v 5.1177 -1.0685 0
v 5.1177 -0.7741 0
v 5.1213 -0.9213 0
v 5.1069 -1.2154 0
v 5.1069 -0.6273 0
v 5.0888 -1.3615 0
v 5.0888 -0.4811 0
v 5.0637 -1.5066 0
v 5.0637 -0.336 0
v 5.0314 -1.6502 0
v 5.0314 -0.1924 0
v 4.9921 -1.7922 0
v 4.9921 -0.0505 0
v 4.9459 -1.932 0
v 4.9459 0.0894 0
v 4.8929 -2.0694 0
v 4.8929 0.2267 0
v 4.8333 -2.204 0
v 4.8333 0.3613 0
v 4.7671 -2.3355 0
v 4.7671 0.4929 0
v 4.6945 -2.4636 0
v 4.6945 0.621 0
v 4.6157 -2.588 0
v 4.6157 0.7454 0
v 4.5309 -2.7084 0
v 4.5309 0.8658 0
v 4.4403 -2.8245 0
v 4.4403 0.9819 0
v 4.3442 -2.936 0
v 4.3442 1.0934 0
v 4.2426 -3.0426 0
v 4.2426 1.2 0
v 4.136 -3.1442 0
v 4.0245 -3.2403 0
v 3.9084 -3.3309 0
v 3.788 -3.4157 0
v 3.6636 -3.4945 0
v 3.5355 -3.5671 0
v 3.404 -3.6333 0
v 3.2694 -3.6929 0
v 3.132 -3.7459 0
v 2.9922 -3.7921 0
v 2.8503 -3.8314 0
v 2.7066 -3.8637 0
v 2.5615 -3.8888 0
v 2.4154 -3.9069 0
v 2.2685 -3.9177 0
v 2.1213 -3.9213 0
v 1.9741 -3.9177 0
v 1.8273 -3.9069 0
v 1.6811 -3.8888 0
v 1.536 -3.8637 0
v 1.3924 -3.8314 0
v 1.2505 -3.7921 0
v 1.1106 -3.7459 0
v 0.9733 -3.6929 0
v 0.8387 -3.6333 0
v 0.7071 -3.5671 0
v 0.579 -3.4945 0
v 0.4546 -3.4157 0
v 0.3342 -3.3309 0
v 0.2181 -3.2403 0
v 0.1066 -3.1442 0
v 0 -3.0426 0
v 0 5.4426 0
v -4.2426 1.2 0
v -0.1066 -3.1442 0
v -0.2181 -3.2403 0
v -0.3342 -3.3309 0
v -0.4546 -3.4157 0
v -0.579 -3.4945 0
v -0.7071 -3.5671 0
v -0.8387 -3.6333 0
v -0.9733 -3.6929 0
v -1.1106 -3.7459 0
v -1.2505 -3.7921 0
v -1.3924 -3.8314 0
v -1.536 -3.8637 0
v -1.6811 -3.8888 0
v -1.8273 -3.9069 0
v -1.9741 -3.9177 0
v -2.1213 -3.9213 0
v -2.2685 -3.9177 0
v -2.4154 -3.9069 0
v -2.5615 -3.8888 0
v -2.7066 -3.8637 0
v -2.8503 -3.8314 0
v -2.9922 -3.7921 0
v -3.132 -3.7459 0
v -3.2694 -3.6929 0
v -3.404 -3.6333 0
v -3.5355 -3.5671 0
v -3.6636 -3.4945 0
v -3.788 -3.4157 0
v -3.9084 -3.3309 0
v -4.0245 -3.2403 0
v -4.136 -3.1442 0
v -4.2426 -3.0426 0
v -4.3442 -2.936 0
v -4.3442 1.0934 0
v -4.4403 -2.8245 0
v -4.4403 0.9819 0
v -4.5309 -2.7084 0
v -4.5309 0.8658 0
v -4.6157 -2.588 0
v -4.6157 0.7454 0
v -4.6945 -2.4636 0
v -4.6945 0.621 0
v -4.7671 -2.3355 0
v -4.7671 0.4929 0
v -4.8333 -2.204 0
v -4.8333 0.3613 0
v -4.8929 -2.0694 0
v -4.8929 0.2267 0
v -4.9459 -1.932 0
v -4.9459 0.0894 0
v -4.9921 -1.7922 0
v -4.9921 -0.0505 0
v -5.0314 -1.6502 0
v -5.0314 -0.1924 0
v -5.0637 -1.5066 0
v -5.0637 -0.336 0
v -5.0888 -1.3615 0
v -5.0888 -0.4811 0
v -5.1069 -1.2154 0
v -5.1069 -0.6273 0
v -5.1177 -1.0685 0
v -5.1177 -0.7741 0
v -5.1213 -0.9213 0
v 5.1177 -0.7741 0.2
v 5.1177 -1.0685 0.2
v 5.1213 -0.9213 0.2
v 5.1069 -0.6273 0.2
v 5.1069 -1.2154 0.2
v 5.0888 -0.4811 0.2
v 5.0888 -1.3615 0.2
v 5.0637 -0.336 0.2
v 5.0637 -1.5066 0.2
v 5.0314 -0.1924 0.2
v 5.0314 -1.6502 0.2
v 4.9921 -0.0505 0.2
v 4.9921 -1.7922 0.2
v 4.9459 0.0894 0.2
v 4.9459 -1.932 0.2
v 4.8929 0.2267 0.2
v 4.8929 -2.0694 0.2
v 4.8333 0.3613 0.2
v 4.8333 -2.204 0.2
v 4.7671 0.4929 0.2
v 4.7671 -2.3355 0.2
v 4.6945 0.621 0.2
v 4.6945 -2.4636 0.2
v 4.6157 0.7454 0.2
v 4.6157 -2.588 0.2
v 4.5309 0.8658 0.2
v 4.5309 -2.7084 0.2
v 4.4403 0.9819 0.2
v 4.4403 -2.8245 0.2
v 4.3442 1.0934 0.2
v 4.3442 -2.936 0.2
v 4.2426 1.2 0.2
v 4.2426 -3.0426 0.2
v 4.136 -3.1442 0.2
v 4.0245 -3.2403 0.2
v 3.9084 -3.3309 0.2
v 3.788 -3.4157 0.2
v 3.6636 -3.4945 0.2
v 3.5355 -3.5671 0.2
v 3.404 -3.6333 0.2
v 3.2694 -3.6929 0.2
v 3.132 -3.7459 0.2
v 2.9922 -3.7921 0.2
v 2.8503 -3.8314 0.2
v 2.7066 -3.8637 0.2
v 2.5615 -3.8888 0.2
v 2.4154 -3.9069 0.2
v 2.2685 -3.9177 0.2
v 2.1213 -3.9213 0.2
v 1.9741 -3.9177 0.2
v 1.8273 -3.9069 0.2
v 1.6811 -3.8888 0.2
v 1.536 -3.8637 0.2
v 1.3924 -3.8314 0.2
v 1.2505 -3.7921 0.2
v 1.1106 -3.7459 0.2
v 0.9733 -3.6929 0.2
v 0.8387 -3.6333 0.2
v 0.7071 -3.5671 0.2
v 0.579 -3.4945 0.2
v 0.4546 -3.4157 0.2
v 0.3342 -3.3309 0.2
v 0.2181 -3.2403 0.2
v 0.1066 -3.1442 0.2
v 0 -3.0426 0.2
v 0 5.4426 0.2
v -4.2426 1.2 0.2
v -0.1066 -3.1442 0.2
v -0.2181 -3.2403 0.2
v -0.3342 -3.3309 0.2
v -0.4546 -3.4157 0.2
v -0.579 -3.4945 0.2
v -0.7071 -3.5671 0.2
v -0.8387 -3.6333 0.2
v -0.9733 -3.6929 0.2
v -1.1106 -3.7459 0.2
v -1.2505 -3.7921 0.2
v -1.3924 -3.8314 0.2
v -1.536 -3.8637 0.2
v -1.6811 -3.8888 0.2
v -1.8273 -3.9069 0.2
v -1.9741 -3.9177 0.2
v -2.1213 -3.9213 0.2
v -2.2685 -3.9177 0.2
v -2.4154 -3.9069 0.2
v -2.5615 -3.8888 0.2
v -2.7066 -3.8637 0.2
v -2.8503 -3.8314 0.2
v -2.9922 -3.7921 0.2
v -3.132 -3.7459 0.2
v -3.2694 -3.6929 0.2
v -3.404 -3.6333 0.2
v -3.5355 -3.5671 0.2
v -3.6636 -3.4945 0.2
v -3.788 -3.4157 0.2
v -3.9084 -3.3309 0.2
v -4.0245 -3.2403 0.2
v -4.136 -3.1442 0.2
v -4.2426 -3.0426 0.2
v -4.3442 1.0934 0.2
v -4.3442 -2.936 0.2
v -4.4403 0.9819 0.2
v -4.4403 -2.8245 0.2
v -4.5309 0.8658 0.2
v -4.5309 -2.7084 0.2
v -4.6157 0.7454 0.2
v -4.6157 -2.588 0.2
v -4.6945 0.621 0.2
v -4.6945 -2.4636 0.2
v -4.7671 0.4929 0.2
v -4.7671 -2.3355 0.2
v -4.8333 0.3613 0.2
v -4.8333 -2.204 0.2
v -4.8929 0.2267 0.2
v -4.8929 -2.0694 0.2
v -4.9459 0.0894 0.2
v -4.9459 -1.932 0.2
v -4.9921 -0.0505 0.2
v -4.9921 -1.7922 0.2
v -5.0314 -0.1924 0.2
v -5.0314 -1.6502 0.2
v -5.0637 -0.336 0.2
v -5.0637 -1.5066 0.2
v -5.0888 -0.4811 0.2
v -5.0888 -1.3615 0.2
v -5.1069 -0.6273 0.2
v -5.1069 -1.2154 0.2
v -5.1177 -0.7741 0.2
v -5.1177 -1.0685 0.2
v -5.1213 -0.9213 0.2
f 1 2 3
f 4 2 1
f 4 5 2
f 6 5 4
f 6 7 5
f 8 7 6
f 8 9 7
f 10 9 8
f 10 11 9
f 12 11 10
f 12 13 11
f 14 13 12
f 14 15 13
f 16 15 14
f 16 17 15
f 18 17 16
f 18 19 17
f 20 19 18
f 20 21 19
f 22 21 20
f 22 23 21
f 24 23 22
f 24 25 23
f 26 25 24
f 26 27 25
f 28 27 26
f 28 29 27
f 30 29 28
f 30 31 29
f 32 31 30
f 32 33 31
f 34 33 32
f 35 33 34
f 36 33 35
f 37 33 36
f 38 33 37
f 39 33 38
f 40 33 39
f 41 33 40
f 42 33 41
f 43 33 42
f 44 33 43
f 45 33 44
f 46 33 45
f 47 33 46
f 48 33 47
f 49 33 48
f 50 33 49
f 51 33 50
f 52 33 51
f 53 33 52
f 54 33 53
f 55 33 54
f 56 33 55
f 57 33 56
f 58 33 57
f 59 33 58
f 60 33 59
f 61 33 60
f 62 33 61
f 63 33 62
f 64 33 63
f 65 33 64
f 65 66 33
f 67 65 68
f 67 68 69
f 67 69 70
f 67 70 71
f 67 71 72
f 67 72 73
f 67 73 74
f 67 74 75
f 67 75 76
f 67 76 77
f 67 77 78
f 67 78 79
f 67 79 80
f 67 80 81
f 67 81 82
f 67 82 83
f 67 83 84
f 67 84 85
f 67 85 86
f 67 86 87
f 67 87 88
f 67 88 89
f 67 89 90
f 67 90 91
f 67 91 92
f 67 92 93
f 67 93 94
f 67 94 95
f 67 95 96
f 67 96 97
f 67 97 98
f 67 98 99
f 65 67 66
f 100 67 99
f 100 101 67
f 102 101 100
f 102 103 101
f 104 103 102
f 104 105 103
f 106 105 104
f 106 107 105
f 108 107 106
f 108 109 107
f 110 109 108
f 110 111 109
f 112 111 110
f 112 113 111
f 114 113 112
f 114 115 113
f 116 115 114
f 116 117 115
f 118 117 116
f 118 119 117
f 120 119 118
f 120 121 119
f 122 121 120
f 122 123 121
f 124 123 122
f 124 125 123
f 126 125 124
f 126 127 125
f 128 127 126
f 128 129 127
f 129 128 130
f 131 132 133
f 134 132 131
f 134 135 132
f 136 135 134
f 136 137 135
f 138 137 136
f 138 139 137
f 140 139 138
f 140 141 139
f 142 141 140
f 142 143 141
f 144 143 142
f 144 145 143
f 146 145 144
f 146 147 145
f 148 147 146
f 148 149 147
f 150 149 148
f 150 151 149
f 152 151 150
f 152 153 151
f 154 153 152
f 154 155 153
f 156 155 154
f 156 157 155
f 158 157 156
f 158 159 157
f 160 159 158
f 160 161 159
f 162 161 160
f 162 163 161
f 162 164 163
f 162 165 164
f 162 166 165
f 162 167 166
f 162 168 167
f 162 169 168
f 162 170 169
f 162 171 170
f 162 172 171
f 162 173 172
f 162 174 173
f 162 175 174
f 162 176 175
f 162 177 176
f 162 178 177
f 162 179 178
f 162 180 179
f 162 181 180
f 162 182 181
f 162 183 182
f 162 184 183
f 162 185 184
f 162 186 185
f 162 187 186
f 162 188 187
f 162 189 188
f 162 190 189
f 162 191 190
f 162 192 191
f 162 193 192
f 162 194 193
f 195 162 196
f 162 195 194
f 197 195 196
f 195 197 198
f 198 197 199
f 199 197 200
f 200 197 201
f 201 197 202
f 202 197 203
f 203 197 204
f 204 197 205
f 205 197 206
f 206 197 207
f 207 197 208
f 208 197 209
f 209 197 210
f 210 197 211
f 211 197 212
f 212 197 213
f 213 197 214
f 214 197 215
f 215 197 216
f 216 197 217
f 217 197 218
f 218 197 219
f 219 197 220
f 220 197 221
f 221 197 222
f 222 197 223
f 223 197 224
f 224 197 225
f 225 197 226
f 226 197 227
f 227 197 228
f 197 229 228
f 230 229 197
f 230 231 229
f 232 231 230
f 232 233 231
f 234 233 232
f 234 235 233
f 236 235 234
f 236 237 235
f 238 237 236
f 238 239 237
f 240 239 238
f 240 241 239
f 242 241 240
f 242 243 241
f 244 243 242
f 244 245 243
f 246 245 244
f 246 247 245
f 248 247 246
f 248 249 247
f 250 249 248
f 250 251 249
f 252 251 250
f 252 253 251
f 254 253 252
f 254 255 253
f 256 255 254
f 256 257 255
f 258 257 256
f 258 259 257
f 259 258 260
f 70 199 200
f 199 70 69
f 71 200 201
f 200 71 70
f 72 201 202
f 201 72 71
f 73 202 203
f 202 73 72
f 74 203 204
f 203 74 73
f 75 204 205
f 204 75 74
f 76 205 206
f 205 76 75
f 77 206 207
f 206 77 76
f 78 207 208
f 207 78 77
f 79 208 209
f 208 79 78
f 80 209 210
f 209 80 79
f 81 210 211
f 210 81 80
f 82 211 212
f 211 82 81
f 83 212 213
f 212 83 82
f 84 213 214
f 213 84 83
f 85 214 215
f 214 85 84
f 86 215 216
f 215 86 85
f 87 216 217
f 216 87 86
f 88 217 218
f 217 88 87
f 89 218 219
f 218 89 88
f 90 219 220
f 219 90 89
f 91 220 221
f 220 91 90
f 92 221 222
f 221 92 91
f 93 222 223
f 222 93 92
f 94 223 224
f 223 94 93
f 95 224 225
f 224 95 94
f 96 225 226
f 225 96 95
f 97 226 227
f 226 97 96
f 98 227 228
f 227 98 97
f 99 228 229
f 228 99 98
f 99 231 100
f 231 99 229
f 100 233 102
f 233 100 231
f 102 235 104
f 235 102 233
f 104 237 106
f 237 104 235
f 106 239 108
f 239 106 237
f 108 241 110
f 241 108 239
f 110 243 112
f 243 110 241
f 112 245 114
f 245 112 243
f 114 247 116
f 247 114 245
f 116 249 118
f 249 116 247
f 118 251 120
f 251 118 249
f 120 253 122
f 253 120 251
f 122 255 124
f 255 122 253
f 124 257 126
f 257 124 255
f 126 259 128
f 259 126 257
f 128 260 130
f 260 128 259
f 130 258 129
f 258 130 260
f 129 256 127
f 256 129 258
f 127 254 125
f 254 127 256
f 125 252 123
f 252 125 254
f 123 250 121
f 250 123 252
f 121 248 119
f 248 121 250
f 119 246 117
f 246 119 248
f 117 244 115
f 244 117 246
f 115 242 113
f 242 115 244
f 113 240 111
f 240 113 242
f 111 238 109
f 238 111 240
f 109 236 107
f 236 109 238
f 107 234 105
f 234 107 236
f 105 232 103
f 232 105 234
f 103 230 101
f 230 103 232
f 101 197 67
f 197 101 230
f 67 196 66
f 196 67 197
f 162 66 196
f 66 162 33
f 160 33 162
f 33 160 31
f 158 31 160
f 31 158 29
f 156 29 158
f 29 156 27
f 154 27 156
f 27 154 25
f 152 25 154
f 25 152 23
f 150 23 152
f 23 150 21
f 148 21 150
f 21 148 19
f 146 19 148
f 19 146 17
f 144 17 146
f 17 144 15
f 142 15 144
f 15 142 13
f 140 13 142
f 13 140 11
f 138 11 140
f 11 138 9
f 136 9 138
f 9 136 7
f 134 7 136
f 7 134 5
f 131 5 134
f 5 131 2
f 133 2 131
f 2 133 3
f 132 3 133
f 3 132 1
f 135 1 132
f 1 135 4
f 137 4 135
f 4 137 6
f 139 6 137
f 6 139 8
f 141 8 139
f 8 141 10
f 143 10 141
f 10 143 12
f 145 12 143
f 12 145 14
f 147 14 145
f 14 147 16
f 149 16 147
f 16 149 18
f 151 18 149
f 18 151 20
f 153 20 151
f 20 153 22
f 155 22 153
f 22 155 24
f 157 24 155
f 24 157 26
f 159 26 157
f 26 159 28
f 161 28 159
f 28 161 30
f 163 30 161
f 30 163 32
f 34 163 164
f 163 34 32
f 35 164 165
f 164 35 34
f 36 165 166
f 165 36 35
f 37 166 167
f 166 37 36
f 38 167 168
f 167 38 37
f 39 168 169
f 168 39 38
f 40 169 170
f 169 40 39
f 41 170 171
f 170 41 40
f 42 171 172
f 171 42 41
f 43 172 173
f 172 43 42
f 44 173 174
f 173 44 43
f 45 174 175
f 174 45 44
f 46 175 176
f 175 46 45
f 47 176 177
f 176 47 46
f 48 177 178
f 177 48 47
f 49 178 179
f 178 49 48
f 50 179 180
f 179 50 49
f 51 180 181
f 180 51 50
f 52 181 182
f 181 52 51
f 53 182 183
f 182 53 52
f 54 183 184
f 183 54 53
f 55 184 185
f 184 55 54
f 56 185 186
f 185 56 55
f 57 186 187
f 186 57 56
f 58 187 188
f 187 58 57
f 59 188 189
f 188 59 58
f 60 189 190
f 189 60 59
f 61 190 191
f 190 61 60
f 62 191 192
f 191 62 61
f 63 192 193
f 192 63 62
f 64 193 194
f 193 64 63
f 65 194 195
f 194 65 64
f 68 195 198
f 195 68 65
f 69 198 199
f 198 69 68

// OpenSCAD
size_diameter_map = [0, 12.04, 12.45, 12.85, 13.26, 13.67, 14, 14.4, 14.8, 15.2, 15.6, 16.0, 16.45, 16.9, 17.3, 17.7, 18.2, 18.6, 19.0, 19.4, 19.8, 20.2, 20.6, 21.0, 21.4, 21.8, 22.2, 22.6];
function ring_radius_from_US_size(size) = size_diameter_map[size*2]/2;

echo(version());


//ring_size = 10.5; cone_angle=60; // alan
ring_size = 2; cone_angle=30; // dana 2025/02


// would prefer to factor these parameter computations into 
// a factored out function...

// high level ring design parameters
rt=2;   // ring band thickness (nominal)
seal_depth = 0.2;
seal_radius_relative = 0.75;
//cone_angle=30;

band_width = 5;

// computed parameters
ri = ring_radius_from_US_size(ring_size);  // ring inner radius
ro=ri+rt;  // ring outer radius (sphere outer radius)
d = ro*sin(cone_angle/2);   // |(sphere center) - (cone base)|
r1 = ro*cos(cone_angle/2);  // cone radius
h = ro/sin(cone_angle/2) - d;  // cone height

r_top = 2*(ro-d)/h*r1; // signet top radius  TODO this equation is wrong
r_logo = r_top * seal_radius_relative;  // radius of containing circle of logo
echo("r_logo", r_logo);
echo("r_top", r_top);
echo(d);


module smooth_ring_base() {
    // https://www.thingiverse.com/thing:2011638/files
    // sphere, cone, shave off top and bottom
    // logo on top
    // inscription on bottom
    // two cubes to make it slanty
    // TODO bevel sharp edge    
    
    difference() {
        union() {
            // main body
            sphere(r=ro, $fn=64);
            // cone
            translate([0, 0, d]) 
                cylinder(r1=r1, r2=0, h=h, $fn=128);
        }

        // shave off the top
        translate([-ro, -ro, ro*1.0]) cube(ro*4);
        // ring hole
        translate([0, ro, 0])
            rotate([90, 0, 0])
                cylinder(r=ri, h=3*ro, $fn=128);

                
        // y offset of these cylinders needs to be at the
        // uppermost intersection of the cone and the 
        // finger-hole cylinder
        // cone:
        // x*x + y*y = R*R*(z-H)**2/H*H  (R = r1*(h+d)/h, H = h+d)
        // cylinder:
        // x*x + z*z = A*A               (A = ri)
        // x = sqrt(A*A-z*z)
        // A*A-z*z + y*y = R*R*(z-H)**2/H*H
        // set z = A, the top of the cylinder
        // A*A-A*A + y*y = R*R*(A-H)**2/H*H
        // y*y = R*R*(A-H)**2/H*H
        A = ri;
        R = r1*(h+d)/h;
        H = h+d;
        yy = R*R*(A-H)*(A-H)/(H*H);
        y = sqrt(yy);
        
        echo(d, ri/2);
        
        // y - yy = band_width/2
        // yy = y - band_width/2
        
        translate([-ro, -y, -ri]) 
            rotate([0, 90, 0]) 
                scale([ri*2, y-band_width/2, 1]) 
                    cylinder(h=ro*2, r=1, $fn=128);
        translate([-ro, +y, -ri]) 
            rotate([0, 90, 0]) 
                scale([ri*2, y-band_width/2, 1]) 
                    cylinder(h=ro*2, r=1, $fn=128);
        
    }
}

module heart(r=1) {
 d = sqrt(2)/2;  // half-diagonal of the square
 union() {
  translate([r*d, r*d]) circle(r=r, $fn=128);
  translate([-r*d, r*d]) circle(r=r, $fn=128);
  rotate(45) square(2*r, center=true);
 }
}



module pilosa_sloth(r=1, h=1) {
    scale([r, r, 1])
    translate([-1, -1, h/2])
        scale([.02, .02, h])
            import(file="logo-sloth-only.svg_1mm.stl", center=true);
}

//pilosa_sloth();

module image_svg(svg, r=1) {
 translate([0, 0, ro-seal_depth])
  scale([.01*r*r_logo, .01*r*r_logo, .1])
   linear_extrude(h)
    import(file=svg, center=true);
}

module ring_base_heart(r) {
    difference() {
        smooth_ring_base();
        translate([0, -r*.4, ro-seal_depth]) linear_extrude(1) heart(r);
    }
}

module ring_image_heart(r) {
    intersection() {
        smooth_ring_base();
        translate([0, -r*.4, ro-seal_depth]) linear_extrude(1) heart(r);    
    }
}


module ring_base_svg(svg, r) {
    difference() {
        smooth_ring_base();
        image_svg(svg, r);
    }
}

module ring_image(svg, r) {
    intersection() {
        smooth_ring_base();
        image_svg(svg, r);
    }
}

//svg = "svg/ballerina-1-norm.svg"; r = 13;
//svg = "svg/ballerina-2-norm.svg"; r = 11;
r = 3; // for heart
translate([0, 0, ri+rt]) rotate([180, 0, 0]) 
{
 //ring_base_svg(svg, r);
 //ring_base_heart(r);
 ring_image_heart(r);
 //heart();
 //color("red") 
 //ring_image(svg, r);
 //image_svg(svg, r);
}

//translate([0, 0, -2]) rotate([90, 0, 0]) cylinder(d=0.2, h=10, $fn=128);

module inscription() {
   // TODO text engraved on the underside of the signet
   // TODO text engraved all along the ring exterior
   // pattern instead of text?
   // solid and hollow circles?
   // negative spherical segments - golfball divots
   // binary encode a message? 
}

module pilosa_ring(ring_size) {
    ri = ring_radius_from_US_size(ring_size);  // ring inner radius
    ro=ri+rt;  // ring outer radius (sphere outer radius)
    d = ro*sin(cone_angle/2);   // |(sphere center) - (cone base)|
    r1 = ro*cos(cone_angle/2);  // cone radius
    h = ro/sin(cone_angle/2) - d;  // cone height

    r_top = 2*(ro-d)/h*r1; // signet top radius  TODO this equation is wrong
    r_logo = r_top * seal_radius_relative;  // radius of containing circle of logo
    difference() {
        smooth_ring_base(ring_size);
        translate([0, 0, ro-seal_depth])
            #pilosa_sloth(r=r_logo, h=1.2);  // seal
        inscription();
    }
}
//pilosa_ring(10.5);


//pilosa_sloth(r=2, h=2);


module alan_wedding_ring() {
    // band width = 5mm
    // band thickness = 2.2mm
    // inner radius = 20.0mm
    // outer radius = 24.5mm
}



/*

angle=7;
d=3;
W0=10;  // max width of ring cylinder
W1=5;   // min width of ring cylinder
rt=2;   // ring thickness
ro=ri+rt;

module ring() {
    difference() {
        cylinder(r=ro, h=W0, $fn=128);
        // TODO adjust angle of cubes to make W0, W1 work
        // TODO subtract off a layer of the ring so signet lies flat
        translate([0, 0, -1]) cylinder(r=ri, h=W0+2, $fn=128);
        translate([0, 0, -d]) rotate([angle, 0, 0]) cube([50, 50, 10], center=true);
        translate([0, 0, W0+d]) rotate([-angle, 0, 0]) cube([50, 50, 10], center=true);
    }
}

module signet() {
    // TODO: put "10101" on the bottom
    difference() {
        cylinder(r=8, h=2, $fn=128);
        scale([-0.08, 0.08, 1])
          translate([-85.87, -85.87, 0])
            import(file="logo-sloth-only.ai.svg_1mm.stl");
    }
}

// v1
//translate([0, W0/2, ro+1]) rotate([90, 0, 0]) ring();
//signet();
*/
